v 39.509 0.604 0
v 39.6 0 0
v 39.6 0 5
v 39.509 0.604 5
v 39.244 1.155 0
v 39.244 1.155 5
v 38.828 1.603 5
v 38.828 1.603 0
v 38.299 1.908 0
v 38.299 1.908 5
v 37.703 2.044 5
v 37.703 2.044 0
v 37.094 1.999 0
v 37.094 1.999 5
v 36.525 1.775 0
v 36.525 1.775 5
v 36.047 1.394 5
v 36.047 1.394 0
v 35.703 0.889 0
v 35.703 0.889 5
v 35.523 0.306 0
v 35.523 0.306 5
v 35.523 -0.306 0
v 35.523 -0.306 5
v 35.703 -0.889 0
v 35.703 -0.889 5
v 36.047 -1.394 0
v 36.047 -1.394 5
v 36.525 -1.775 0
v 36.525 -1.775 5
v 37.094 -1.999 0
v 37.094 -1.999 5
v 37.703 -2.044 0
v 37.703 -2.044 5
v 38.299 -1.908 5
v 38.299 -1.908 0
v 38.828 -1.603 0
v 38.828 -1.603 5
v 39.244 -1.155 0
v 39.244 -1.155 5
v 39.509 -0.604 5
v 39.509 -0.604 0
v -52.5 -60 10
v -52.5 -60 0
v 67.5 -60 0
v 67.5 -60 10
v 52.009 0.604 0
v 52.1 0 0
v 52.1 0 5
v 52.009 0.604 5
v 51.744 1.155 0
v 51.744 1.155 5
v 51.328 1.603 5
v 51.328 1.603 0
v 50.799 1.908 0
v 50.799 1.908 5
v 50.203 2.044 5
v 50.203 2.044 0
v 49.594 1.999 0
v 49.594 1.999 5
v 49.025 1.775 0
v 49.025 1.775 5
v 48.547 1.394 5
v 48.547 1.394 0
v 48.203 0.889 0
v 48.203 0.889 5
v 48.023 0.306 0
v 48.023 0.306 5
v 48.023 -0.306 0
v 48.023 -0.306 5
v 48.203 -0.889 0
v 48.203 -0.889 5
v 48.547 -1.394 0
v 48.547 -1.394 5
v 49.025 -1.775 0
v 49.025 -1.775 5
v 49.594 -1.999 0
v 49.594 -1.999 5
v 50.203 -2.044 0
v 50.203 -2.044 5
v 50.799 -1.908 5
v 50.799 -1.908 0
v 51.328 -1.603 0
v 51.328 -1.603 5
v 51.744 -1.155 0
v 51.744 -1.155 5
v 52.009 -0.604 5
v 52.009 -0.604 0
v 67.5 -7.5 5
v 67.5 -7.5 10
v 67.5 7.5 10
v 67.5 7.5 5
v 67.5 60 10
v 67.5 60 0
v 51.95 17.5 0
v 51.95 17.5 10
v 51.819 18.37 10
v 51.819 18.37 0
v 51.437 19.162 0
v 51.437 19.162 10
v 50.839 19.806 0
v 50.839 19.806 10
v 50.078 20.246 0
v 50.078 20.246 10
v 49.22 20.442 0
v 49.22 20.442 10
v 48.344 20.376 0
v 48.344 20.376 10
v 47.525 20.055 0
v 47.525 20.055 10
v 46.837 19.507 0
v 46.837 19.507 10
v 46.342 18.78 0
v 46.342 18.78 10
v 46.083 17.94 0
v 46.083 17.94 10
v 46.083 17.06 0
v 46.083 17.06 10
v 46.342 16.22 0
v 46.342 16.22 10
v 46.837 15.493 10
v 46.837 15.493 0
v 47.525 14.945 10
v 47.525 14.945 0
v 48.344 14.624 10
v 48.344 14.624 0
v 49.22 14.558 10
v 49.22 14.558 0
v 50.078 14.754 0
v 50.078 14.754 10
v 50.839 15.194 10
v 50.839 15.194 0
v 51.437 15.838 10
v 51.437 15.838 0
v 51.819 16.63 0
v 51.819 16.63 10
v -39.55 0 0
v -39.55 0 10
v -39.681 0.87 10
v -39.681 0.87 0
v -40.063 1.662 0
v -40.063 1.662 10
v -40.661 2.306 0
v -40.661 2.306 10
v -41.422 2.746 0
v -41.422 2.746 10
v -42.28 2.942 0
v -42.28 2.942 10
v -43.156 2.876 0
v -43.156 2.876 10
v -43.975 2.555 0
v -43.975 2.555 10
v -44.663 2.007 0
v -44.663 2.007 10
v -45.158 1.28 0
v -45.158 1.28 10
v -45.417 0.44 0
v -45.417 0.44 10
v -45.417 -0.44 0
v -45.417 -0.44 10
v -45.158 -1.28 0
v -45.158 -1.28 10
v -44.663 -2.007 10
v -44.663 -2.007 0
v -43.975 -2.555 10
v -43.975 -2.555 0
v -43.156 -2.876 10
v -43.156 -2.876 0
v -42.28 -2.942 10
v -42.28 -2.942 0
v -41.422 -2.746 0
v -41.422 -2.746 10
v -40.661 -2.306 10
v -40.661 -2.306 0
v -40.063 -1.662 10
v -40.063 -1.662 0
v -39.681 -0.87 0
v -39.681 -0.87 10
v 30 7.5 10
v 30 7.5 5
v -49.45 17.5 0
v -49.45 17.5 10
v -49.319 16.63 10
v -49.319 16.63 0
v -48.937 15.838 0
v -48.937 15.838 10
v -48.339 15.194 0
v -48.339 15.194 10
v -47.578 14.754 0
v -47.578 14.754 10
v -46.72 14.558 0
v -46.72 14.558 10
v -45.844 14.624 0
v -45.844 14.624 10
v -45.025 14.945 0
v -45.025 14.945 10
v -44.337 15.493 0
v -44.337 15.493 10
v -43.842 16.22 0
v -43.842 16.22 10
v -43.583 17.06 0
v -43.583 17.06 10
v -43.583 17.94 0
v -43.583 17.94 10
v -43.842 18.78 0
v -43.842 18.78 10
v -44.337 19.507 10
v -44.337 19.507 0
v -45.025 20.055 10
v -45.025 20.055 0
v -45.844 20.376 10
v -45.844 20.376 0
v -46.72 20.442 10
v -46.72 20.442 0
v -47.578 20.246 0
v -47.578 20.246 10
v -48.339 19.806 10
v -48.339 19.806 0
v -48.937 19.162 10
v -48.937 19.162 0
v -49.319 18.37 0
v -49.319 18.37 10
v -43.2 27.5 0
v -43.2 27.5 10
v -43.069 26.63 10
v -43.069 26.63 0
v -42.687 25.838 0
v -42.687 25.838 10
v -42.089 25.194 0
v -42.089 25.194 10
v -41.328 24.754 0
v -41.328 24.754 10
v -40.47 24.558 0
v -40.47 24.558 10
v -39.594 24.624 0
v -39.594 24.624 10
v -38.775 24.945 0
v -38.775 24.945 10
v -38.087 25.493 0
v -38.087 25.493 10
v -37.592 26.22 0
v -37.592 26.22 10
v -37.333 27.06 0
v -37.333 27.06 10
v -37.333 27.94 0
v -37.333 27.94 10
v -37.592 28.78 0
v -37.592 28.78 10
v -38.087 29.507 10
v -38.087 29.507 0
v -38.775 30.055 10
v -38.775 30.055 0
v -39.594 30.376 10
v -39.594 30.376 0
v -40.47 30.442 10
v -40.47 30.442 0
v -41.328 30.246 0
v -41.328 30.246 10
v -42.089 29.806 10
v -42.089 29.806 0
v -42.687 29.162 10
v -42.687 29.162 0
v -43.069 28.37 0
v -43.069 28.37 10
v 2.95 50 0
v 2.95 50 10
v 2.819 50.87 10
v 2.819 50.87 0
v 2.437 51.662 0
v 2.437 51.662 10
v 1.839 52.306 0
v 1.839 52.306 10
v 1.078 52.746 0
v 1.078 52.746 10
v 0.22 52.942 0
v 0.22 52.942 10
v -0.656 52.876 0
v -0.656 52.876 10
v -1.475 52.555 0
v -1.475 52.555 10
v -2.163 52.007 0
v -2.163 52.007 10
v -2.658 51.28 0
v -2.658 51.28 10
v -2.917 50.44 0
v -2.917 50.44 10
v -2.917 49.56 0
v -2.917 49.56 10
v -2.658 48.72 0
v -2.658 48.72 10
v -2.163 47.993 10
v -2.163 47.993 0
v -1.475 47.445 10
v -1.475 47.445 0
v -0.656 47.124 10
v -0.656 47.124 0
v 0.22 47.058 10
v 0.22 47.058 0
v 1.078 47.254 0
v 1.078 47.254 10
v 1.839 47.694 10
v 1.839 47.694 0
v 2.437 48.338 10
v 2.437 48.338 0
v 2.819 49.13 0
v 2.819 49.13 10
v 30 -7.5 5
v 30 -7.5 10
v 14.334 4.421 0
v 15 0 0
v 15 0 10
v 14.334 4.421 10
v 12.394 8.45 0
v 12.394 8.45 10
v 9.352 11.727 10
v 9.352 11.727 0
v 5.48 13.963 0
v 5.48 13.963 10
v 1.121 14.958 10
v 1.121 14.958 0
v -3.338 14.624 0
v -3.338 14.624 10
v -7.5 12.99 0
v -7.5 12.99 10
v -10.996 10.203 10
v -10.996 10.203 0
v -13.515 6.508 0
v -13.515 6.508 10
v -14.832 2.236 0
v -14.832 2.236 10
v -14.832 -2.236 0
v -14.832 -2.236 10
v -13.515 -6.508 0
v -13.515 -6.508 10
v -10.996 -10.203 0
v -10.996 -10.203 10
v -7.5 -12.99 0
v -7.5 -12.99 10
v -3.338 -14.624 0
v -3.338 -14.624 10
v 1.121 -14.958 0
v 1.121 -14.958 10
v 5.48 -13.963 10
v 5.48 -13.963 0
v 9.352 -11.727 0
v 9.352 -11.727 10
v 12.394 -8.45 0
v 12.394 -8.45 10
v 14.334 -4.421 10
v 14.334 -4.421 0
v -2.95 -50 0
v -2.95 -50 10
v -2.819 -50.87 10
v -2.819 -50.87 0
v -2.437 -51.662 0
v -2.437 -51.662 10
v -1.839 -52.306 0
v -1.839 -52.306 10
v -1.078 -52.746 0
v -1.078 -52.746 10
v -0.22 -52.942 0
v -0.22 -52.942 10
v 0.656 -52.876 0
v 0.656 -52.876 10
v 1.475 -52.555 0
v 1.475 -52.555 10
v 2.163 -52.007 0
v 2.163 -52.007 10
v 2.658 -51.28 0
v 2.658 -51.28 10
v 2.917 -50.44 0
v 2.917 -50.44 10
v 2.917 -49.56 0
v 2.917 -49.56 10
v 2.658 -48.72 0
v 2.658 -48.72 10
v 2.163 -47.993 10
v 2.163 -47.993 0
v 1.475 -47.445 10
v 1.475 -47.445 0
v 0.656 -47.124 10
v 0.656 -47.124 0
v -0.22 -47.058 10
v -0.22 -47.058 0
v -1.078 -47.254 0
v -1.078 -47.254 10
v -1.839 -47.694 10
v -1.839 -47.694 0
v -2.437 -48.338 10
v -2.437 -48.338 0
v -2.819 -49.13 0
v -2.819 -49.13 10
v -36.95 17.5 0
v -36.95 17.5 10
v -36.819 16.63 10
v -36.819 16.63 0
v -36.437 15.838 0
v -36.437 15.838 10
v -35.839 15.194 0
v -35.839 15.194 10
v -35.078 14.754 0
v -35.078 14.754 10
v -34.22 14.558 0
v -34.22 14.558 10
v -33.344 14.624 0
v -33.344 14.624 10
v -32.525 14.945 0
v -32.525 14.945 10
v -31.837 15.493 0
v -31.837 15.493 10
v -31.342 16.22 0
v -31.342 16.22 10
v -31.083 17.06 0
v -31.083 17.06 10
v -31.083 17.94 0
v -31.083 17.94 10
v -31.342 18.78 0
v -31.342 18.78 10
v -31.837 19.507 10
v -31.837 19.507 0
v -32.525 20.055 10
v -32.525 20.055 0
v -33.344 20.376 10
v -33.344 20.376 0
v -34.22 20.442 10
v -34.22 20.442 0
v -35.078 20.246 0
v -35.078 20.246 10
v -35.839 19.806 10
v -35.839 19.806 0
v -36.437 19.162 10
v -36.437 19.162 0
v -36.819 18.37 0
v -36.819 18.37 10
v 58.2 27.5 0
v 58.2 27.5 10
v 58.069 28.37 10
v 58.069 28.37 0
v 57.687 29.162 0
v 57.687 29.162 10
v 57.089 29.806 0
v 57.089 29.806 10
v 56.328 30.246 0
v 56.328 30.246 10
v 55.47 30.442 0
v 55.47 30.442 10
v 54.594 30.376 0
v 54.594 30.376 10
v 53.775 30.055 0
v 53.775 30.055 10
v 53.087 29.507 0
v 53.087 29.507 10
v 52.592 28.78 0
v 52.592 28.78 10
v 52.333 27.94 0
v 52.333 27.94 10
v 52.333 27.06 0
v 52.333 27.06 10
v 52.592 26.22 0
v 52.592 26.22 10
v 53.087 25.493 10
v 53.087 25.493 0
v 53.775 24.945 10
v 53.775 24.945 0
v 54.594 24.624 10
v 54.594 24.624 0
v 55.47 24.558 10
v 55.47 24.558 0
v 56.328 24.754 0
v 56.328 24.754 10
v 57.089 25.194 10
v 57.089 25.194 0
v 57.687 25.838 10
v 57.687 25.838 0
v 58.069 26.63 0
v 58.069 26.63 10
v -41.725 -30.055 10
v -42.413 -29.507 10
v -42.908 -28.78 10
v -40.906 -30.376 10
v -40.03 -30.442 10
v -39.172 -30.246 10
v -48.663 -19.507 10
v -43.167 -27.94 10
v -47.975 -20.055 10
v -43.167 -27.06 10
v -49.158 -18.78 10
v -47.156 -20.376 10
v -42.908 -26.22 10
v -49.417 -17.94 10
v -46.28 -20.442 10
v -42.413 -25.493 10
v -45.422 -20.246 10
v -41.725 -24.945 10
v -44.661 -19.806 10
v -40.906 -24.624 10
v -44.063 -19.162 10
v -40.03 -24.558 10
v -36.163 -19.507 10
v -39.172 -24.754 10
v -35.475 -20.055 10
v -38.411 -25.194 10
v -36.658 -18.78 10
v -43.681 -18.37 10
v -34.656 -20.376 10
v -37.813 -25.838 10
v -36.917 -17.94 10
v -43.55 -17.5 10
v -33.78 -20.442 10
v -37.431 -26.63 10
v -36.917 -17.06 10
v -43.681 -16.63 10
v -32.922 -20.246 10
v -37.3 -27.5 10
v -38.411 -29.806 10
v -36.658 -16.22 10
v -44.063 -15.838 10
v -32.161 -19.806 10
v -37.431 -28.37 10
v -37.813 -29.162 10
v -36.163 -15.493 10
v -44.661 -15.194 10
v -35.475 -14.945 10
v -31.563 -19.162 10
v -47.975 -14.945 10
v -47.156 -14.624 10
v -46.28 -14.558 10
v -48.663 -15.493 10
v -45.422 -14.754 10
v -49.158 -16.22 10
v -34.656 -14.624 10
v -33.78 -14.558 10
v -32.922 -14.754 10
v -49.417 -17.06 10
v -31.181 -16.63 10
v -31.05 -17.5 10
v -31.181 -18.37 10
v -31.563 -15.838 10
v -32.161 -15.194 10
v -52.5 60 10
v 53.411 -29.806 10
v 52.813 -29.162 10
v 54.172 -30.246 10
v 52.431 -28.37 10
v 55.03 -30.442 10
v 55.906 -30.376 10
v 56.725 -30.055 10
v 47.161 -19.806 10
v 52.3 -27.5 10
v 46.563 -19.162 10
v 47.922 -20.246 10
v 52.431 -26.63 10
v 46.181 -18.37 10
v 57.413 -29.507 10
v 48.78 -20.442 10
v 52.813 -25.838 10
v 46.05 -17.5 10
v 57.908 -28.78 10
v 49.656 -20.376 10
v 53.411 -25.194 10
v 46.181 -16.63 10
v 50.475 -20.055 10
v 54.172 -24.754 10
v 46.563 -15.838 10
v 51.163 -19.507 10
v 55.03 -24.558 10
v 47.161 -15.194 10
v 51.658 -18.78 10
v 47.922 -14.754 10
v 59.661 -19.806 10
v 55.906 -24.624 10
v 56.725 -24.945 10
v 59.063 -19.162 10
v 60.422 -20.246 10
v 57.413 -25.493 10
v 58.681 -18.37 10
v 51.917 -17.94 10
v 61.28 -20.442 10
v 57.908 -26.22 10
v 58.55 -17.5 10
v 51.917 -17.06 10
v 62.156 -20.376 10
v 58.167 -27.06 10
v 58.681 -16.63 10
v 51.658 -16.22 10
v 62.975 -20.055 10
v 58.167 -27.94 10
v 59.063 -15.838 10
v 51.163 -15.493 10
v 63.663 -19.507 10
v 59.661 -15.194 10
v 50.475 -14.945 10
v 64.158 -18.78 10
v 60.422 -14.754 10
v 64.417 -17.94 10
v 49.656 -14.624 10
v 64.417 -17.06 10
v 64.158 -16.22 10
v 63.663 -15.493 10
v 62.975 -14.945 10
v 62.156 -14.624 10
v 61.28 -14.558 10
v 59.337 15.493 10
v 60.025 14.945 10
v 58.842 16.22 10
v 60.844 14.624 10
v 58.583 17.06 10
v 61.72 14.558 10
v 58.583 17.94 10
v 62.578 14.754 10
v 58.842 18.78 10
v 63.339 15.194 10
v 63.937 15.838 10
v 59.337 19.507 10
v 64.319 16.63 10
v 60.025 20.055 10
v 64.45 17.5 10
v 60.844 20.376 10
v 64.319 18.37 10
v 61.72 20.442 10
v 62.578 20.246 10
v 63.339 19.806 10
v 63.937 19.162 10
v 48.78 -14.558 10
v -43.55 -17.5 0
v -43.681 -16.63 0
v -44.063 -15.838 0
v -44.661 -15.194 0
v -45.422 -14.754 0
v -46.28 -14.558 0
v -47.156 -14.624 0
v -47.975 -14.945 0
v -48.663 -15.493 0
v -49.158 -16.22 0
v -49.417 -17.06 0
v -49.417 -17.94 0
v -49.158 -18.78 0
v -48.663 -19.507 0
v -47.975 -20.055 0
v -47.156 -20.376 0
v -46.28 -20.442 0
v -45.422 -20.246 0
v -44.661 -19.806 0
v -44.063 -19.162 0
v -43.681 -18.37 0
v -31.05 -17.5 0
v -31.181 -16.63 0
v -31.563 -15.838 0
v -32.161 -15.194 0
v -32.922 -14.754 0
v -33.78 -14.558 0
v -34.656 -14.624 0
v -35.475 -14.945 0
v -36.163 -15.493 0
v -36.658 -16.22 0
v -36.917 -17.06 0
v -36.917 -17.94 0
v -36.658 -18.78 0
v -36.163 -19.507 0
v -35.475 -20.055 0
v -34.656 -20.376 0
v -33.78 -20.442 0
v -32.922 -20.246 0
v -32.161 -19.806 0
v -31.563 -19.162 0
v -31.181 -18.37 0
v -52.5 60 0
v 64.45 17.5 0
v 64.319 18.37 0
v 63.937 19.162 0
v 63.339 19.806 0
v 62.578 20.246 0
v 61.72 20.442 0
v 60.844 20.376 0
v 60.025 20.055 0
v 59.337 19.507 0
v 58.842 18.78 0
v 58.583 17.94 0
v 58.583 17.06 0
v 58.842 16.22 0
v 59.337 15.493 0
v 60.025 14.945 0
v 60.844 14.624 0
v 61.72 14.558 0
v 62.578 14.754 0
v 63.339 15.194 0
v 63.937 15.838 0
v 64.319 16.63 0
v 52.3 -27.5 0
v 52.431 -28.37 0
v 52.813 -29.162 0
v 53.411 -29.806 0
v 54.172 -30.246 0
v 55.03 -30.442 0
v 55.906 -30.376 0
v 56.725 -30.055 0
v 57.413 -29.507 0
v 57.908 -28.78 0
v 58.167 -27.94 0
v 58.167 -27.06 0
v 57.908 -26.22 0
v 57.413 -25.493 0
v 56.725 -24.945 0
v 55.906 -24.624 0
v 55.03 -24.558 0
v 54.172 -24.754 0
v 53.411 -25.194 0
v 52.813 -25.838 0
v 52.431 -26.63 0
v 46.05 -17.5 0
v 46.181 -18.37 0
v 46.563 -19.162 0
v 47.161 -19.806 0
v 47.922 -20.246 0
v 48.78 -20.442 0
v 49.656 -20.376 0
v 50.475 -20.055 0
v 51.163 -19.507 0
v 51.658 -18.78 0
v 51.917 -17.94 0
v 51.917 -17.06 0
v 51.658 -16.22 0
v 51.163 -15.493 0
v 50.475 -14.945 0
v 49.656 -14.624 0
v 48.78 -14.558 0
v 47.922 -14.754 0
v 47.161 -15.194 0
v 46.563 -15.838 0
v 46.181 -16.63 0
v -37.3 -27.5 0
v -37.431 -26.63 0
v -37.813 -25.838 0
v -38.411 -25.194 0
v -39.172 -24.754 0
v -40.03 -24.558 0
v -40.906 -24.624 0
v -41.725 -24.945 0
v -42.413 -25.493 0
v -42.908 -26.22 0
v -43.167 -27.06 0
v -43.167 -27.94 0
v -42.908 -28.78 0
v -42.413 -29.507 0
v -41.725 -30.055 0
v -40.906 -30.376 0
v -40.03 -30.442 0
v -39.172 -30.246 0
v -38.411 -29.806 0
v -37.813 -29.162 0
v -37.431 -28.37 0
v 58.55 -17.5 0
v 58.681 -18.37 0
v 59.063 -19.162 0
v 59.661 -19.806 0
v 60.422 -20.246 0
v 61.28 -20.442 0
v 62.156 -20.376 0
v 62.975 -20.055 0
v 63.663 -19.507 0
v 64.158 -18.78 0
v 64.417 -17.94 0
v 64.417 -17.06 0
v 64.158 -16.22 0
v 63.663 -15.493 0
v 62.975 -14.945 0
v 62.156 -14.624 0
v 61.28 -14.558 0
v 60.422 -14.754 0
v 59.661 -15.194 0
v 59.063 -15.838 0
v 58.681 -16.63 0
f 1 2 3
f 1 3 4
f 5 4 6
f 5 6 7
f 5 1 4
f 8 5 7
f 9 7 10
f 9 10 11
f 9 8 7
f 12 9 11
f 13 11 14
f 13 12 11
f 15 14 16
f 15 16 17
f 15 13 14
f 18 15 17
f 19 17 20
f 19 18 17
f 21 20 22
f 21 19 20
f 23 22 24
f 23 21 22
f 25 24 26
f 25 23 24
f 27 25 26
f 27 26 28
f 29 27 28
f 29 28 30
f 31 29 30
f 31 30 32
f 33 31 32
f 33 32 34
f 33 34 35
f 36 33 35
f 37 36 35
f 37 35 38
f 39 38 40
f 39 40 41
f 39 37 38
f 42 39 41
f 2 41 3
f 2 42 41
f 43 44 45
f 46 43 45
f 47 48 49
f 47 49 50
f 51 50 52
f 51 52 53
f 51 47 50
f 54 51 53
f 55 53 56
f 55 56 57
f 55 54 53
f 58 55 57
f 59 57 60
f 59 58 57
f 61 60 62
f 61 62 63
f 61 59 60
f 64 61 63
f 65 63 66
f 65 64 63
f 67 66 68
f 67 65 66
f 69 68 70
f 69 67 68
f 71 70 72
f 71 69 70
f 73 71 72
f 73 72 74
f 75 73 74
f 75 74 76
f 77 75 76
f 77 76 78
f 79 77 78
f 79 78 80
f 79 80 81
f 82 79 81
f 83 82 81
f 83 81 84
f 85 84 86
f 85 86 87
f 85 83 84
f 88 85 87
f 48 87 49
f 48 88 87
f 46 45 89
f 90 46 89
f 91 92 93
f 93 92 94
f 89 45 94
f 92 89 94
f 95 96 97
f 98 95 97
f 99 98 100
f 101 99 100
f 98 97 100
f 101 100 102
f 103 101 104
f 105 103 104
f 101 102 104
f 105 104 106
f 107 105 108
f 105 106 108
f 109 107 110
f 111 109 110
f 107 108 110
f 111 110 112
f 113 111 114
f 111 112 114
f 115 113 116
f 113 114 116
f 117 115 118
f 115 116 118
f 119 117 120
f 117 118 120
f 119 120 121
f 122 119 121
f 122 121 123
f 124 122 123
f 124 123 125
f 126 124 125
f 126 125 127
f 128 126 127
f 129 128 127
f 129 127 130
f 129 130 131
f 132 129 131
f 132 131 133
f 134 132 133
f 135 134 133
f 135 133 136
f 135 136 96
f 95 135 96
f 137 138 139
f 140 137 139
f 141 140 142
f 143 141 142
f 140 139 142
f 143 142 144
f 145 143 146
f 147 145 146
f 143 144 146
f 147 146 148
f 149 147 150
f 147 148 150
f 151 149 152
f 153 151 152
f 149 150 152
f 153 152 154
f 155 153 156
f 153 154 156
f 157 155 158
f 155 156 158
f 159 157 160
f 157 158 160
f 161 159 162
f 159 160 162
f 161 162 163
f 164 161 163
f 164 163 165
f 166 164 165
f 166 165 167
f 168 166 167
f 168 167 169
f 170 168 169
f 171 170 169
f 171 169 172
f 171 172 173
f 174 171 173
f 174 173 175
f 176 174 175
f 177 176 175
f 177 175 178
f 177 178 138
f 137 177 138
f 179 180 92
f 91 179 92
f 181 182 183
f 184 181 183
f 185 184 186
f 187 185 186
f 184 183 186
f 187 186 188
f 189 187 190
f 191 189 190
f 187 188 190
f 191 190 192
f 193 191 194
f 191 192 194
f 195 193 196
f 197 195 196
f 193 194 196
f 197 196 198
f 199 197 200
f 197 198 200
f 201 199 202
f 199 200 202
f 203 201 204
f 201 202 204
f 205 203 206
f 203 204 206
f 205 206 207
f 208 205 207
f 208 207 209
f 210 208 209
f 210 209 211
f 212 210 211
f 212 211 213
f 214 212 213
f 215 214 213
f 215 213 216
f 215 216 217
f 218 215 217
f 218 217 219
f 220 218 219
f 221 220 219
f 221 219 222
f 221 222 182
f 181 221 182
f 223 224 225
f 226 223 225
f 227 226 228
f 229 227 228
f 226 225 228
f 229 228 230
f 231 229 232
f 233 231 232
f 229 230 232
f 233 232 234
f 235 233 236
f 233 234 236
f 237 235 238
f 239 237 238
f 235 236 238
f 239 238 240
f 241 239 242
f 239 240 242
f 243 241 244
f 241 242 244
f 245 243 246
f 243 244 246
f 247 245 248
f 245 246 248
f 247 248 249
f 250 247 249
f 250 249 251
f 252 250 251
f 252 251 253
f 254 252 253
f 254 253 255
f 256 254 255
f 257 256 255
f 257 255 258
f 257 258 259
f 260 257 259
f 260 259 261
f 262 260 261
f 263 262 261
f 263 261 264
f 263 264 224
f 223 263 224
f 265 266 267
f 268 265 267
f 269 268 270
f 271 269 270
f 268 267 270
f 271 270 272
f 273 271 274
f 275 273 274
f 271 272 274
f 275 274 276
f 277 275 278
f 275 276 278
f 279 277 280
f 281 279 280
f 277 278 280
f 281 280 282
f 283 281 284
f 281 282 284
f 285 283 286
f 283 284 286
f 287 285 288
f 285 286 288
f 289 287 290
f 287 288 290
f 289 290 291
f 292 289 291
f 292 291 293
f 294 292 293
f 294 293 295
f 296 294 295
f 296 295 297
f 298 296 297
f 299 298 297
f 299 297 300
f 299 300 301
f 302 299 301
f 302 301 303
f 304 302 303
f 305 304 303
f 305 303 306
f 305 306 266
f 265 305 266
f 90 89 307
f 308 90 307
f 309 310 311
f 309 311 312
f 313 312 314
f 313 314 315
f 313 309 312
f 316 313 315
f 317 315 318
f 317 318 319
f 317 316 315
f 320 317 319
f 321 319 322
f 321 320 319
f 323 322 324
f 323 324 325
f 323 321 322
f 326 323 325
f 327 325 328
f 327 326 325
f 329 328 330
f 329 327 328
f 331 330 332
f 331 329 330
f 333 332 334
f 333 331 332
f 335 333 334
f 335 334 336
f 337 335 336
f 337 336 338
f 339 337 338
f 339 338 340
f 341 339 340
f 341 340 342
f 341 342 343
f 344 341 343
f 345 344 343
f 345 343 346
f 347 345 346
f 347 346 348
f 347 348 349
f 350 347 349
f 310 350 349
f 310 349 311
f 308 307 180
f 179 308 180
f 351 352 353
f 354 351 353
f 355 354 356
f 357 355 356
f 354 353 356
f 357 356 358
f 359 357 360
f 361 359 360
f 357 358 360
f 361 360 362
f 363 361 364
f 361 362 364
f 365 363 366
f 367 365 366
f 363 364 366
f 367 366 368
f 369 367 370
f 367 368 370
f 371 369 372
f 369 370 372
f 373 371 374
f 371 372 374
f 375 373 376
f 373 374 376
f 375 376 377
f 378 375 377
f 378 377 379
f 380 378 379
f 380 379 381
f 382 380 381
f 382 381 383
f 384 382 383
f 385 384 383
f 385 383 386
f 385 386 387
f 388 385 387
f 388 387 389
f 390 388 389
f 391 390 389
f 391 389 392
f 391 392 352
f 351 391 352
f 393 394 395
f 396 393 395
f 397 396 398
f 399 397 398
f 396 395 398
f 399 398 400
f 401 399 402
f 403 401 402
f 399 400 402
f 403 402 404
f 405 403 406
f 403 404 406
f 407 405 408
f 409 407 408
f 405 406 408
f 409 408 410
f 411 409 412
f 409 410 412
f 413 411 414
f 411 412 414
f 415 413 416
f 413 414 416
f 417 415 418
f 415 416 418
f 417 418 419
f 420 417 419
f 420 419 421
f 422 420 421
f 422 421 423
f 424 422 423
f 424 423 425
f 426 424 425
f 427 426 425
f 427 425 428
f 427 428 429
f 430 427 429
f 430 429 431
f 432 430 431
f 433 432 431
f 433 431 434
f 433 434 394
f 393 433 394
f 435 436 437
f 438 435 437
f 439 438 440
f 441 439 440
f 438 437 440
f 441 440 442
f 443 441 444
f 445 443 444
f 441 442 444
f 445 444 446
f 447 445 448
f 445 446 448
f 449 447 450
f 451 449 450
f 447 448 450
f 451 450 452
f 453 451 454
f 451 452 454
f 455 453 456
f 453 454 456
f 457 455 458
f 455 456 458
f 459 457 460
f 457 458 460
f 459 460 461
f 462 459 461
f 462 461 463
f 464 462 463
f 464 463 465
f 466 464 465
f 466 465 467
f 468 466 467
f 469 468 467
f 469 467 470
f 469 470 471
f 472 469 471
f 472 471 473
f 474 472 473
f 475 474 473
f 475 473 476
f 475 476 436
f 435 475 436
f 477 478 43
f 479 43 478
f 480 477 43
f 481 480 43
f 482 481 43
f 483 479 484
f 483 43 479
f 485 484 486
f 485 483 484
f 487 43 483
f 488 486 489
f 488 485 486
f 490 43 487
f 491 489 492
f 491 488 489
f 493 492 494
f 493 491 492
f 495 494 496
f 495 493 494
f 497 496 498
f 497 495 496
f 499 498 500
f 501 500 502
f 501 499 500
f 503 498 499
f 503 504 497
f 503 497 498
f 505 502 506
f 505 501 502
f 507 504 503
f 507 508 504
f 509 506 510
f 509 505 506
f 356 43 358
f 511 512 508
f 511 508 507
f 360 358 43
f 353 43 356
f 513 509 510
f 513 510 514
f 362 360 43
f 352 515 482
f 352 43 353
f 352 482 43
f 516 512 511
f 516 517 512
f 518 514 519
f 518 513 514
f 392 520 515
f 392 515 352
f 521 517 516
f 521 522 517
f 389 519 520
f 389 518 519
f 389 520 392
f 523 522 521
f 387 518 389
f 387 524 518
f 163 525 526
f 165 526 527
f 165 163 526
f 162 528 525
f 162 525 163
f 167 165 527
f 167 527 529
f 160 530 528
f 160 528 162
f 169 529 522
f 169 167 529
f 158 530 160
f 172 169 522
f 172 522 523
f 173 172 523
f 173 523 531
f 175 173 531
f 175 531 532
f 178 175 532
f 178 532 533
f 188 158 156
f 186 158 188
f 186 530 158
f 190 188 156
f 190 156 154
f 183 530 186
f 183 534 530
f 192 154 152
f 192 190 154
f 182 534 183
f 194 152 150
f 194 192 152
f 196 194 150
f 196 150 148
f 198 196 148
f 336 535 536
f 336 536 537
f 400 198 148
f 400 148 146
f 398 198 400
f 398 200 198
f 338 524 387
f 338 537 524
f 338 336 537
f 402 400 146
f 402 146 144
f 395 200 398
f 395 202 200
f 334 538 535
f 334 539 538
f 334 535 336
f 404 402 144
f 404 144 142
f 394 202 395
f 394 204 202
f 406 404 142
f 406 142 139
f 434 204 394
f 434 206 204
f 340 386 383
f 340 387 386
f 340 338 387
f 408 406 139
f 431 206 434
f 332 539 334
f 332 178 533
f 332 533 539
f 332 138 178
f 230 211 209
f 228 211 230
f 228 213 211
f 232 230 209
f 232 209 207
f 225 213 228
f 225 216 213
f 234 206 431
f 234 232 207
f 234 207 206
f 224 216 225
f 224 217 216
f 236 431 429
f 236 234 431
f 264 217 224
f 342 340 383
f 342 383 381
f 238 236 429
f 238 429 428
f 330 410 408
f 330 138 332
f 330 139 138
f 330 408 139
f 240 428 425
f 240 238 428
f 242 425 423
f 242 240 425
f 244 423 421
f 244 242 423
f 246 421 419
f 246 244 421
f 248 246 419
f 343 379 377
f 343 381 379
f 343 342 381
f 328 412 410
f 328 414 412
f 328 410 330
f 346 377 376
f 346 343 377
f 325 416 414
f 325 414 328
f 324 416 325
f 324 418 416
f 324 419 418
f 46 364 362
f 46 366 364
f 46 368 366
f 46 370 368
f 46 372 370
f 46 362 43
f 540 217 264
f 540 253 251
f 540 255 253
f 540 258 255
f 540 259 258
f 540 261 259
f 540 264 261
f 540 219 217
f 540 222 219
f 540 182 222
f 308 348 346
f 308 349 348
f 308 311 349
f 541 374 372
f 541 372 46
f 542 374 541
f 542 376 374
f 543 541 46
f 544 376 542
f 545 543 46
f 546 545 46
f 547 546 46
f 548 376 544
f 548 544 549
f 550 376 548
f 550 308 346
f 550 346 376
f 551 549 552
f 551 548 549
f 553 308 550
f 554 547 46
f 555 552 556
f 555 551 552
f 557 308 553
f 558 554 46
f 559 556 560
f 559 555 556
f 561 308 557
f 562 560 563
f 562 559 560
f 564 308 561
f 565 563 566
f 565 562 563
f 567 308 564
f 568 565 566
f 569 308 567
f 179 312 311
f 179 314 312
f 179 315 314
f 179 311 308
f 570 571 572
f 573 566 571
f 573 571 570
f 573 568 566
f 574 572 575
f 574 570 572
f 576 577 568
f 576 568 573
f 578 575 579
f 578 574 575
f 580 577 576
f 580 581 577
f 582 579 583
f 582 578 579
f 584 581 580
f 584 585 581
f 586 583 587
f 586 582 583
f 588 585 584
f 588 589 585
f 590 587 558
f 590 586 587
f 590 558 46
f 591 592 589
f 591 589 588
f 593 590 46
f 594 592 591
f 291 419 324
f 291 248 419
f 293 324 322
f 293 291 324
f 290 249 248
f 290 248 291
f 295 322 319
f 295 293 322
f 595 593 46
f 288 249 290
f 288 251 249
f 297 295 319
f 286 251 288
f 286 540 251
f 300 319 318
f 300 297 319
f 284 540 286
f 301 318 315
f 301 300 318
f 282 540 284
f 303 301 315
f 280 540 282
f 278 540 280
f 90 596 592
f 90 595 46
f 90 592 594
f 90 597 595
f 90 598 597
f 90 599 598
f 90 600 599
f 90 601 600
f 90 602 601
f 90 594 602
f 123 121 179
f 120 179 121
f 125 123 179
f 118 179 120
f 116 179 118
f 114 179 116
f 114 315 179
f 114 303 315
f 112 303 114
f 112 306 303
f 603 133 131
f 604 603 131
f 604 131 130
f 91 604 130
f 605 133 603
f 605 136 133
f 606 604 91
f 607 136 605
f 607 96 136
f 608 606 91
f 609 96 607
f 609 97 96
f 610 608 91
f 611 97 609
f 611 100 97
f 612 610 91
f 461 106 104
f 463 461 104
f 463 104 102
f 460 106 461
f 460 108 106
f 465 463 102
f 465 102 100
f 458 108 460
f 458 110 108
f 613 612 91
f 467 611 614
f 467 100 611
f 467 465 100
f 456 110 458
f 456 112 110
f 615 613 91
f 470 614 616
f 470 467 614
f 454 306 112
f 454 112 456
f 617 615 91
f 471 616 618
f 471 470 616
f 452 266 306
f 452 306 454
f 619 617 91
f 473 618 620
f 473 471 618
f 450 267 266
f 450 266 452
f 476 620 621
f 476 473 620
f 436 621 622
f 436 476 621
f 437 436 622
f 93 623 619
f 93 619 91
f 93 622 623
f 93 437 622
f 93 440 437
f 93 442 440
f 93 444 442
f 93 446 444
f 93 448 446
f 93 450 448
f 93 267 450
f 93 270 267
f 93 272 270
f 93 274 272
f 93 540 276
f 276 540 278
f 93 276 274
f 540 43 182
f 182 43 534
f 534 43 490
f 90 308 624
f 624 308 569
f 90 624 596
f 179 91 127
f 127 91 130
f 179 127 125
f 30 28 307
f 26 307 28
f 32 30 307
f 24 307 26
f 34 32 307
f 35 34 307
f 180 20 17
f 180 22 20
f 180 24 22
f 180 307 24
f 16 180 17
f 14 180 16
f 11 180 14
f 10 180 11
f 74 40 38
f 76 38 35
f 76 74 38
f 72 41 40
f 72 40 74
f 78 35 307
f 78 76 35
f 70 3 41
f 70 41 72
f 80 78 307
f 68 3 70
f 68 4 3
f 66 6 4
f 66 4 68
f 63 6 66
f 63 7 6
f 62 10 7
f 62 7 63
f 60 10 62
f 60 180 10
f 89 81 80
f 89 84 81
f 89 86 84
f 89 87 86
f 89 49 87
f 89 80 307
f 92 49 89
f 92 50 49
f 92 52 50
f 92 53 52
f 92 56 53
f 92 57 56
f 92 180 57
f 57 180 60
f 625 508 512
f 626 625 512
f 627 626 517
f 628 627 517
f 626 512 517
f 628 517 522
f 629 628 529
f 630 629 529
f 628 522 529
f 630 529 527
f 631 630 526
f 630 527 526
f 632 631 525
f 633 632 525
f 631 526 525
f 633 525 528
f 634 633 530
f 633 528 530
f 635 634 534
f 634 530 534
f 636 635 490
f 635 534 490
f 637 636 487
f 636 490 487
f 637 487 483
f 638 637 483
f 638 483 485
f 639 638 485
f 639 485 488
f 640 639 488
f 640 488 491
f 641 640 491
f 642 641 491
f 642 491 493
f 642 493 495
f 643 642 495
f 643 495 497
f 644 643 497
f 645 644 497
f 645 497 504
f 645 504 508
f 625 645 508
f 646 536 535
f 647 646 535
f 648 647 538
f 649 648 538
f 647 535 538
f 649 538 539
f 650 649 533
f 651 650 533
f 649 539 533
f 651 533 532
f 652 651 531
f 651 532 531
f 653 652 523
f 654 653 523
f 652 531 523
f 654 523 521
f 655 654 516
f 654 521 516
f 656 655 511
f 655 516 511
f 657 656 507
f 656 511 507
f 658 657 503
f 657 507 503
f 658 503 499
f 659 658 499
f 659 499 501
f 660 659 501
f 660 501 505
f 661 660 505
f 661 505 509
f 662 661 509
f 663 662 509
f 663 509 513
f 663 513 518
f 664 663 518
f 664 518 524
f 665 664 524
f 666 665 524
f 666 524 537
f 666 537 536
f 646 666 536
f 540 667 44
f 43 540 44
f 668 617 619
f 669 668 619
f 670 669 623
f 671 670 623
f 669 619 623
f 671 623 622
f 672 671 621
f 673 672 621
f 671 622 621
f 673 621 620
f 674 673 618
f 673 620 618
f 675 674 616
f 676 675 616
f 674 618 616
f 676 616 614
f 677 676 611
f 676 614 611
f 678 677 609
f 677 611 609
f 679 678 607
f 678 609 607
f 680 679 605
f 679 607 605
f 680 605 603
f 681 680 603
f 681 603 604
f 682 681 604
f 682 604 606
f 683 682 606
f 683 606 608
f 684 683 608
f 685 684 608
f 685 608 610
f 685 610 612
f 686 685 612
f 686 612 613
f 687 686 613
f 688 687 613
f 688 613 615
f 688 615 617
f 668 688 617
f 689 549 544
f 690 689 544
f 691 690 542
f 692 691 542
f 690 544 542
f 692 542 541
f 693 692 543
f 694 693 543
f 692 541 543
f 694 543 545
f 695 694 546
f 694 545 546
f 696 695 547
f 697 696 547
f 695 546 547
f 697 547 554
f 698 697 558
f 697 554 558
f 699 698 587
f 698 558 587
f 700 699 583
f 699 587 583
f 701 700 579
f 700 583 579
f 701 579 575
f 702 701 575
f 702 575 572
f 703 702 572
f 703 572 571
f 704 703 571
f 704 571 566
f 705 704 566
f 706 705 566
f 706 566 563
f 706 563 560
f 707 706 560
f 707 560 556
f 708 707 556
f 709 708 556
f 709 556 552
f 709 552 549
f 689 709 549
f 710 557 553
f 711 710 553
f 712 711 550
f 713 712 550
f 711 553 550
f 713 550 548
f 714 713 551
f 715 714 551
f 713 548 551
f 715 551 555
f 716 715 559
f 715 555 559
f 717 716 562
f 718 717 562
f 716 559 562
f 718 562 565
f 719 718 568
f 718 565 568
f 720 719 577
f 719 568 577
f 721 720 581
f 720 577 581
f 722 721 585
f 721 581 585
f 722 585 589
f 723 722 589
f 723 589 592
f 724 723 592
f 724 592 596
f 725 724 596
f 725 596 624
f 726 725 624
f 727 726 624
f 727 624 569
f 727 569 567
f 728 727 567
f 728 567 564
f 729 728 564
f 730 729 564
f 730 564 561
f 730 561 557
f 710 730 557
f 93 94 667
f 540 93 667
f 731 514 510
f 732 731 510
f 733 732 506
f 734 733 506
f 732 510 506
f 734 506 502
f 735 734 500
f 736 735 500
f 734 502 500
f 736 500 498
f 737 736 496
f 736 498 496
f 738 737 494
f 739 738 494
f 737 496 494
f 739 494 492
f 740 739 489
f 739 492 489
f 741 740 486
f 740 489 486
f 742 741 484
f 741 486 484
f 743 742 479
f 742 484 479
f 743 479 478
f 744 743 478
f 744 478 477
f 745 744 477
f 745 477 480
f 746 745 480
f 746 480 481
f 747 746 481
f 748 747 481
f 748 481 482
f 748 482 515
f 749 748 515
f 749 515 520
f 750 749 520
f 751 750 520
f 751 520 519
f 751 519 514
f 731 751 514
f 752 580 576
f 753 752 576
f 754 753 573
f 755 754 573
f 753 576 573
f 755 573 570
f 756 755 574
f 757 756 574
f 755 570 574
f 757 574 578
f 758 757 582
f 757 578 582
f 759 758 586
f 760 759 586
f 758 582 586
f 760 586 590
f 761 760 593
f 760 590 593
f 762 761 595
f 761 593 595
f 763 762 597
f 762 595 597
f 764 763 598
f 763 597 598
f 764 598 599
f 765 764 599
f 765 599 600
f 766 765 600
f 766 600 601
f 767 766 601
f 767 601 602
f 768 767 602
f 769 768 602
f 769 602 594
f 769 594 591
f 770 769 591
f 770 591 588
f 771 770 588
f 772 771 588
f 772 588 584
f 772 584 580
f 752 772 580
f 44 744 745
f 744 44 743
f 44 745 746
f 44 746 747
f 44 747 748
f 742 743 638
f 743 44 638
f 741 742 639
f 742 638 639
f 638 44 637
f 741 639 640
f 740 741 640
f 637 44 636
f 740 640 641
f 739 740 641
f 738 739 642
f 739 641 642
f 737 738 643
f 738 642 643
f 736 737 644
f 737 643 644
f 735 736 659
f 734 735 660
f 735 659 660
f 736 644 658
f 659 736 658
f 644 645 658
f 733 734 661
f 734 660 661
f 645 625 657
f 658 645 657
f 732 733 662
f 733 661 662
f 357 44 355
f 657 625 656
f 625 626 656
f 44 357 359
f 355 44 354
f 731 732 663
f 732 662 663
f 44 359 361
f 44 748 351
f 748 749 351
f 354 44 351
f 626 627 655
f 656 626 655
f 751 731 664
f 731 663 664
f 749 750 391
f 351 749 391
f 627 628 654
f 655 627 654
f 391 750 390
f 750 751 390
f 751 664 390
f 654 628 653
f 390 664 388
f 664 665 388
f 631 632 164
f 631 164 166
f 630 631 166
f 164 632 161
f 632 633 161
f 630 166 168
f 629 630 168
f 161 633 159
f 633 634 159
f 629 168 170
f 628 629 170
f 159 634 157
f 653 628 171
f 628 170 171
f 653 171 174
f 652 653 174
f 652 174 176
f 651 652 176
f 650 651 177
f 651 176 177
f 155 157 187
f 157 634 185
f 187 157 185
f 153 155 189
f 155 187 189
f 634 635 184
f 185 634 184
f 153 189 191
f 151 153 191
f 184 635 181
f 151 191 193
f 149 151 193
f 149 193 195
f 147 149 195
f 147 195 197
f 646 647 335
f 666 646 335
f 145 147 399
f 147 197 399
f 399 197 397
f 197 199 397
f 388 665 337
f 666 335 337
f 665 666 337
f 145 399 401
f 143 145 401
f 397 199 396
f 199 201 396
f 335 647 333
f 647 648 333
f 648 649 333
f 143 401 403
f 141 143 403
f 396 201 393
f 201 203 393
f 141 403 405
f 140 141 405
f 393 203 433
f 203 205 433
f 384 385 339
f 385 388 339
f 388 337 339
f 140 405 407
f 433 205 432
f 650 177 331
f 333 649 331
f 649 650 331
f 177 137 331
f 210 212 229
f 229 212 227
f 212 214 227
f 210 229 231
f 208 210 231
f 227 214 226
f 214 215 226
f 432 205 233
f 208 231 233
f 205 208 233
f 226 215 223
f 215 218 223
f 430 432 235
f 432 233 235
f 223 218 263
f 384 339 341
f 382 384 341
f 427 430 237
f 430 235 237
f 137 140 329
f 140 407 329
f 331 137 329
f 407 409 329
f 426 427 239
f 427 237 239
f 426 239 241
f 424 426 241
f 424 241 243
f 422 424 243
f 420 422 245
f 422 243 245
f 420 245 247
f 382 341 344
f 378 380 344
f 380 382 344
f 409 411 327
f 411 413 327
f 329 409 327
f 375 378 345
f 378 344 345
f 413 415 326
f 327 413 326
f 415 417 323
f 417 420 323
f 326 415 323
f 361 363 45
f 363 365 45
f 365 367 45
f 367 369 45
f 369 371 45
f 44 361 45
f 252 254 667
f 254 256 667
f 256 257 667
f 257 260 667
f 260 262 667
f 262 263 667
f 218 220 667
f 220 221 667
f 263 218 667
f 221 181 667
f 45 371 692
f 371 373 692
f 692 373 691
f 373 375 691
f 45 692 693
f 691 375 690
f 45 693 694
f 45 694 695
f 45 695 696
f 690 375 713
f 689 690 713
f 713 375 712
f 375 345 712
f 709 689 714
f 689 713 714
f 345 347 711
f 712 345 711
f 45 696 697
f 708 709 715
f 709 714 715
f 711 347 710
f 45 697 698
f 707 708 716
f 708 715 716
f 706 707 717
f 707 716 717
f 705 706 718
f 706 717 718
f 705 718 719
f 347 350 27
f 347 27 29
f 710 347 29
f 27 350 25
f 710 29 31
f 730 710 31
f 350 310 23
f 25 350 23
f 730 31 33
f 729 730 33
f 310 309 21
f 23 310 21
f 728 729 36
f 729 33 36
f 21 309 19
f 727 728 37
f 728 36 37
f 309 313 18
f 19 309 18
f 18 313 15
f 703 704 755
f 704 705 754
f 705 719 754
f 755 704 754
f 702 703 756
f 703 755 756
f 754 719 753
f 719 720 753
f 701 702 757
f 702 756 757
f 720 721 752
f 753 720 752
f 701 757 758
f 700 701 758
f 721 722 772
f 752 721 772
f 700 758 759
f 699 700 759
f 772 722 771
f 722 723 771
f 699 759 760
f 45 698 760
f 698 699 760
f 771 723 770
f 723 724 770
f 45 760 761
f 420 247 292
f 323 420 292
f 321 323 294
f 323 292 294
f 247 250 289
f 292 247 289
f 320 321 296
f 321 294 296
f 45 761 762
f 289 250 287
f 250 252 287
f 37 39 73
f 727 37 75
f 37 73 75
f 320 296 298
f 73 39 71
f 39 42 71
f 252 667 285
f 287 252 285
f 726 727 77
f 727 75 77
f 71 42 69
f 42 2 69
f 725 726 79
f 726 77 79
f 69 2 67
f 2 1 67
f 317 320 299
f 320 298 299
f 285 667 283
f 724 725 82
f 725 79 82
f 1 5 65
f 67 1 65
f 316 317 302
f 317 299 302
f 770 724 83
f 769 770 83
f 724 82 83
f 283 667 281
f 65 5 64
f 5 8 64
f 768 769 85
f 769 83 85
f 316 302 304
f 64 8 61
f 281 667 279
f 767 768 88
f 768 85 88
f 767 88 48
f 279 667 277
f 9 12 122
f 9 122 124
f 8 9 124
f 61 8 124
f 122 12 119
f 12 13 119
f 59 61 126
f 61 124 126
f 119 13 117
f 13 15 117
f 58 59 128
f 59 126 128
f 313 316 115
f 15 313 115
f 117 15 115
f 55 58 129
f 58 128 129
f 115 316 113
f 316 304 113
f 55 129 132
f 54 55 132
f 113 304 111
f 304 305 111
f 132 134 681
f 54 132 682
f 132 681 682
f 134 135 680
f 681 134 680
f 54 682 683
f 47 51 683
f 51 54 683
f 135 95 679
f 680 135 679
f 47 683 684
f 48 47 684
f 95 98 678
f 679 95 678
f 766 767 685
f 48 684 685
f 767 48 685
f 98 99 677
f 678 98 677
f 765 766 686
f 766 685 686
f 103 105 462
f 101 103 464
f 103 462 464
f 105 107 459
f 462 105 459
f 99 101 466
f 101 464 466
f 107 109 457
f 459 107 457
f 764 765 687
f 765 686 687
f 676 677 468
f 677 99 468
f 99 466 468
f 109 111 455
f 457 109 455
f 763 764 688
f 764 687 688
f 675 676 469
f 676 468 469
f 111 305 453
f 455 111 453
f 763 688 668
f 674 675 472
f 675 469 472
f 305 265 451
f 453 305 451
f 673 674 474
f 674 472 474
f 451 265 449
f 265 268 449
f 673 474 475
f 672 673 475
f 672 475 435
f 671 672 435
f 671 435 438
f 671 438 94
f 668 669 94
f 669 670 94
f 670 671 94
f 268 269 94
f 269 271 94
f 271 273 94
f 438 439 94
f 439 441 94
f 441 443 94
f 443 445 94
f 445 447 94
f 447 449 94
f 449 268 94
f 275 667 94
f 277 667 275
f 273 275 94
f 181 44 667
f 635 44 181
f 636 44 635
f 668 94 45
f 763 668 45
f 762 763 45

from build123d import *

# Parameters (mm, degrees)
CROQUIS1_R              = 15
CROQUIS1_W              = 37.5
CROQUIS1_H              = 15
CROQUIS1_R_2            = 2.05
SALIENTE_EXTRUIR1_DEPTH = 5
CROQUIS1_4_R            = 15
SALIENTE_EXTRUIR2_DEPTH = 10
CROQUIS2_R              = 2.95
CORTAR_EXTRUIR1_DEPTH   = 91.863909227


with BuildPart() as part:
    # Croquis1 → Saliente-Extruir1 (new body)
    with BuildSketch(Plane.XY):
        Polygon((67.5, 60), (-52.5, 60), (-52.5, -60), (67.5, -60), (67.5, -7.5), (30, -7.5), (30, 7.5), (67.5, 7.5), align=None)
        Circle(CROQUIS1_R, mode=Mode.SUBTRACT)
        with Locations((48.75, 0)):
            Rectangle(CROQUIS1_W, CROQUIS1_H)
        with Locations((37.55, 0)):
            Circle(CROQUIS1_R_2, mode=Mode.SUBTRACT)
        with Locations((50.05, 0)):
            Circle(CROQUIS1_R_2, mode=Mode.SUBTRACT)
    extrude(amount=SALIENTE_EXTRUIR1_DEPTH)

    # Croquis1<4> → Saliente-Extruir2 (add)
    with BuildSketch(Plane.XY):
        Polygon((67.5, 60), (-52.5, 60), (-52.5, -60), (67.5, -60), (67.5, -7.5), (30, -7.5), (30, 7.5), (67.5, 7.5), align=None)
        Circle(CROQUIS1_4_R, mode=Mode.SUBTRACT)
    extrude(amount=SALIENTE_EXTRUIR2_DEPTH)

    # Croquis2 → Cortar-Extruir1 (cut, through all)
    with BuildSketch(Plane.XY.offset(10)):
        with Locations((49, 17.5)):
            Circle(CROQUIS2_R)
        with Locations((55.25, 27.5)):
            Circle(CROQUIS2_R)
        with Locations((61.5, 17.5)):
            Circle(CROQUIS2_R)
        with Locations(Location((61.5, -17.5, 0), (0, 0, 180))):
            Circle(CROQUIS2_R)
        with Locations(Location((55.25, -27.5, 0), (0, 0, 180))):
            Circle(CROQUIS2_R)
        with Locations(Location((49, -17.5, 0), (0, 0, 180))):
            Circle(CROQUIS2_R)
        with Locations((-42.5, 0)):
            Circle(CROQUIS2_R)
        with Locations((0, 50)):
            Circle(CROQUIS2_R)
        with Locations(Location((0, -50, 0), (0, 0, 180))):
            Circle(CROQUIS2_R)
        with Locations((-40.25, -27.5)):
            Circle(CROQUIS2_R)
        with Locations((-46.5, -17.5)):
            Circle(CROQUIS2_R)
        with Locations((-34, -17.5)):
            Circle(CROQUIS2_R)
        with Locations(Location((-34, 17.5, 0), (0, 0, 180))):
            Circle(CROQUIS2_R)
        with Locations(Location((-46.5, 17.5, 0), (0, 0, 180))):
            Circle(CROQUIS2_R)
        with Locations(Location((-40.25, 27.5, 0), (0, 0, 180))):
            Circle(CROQUIS2_R)
    extrude(amount=-CORTAR_EXTRUIR1_DEPTH, mode=Mode.SUBTRACT)


solid = part.part
